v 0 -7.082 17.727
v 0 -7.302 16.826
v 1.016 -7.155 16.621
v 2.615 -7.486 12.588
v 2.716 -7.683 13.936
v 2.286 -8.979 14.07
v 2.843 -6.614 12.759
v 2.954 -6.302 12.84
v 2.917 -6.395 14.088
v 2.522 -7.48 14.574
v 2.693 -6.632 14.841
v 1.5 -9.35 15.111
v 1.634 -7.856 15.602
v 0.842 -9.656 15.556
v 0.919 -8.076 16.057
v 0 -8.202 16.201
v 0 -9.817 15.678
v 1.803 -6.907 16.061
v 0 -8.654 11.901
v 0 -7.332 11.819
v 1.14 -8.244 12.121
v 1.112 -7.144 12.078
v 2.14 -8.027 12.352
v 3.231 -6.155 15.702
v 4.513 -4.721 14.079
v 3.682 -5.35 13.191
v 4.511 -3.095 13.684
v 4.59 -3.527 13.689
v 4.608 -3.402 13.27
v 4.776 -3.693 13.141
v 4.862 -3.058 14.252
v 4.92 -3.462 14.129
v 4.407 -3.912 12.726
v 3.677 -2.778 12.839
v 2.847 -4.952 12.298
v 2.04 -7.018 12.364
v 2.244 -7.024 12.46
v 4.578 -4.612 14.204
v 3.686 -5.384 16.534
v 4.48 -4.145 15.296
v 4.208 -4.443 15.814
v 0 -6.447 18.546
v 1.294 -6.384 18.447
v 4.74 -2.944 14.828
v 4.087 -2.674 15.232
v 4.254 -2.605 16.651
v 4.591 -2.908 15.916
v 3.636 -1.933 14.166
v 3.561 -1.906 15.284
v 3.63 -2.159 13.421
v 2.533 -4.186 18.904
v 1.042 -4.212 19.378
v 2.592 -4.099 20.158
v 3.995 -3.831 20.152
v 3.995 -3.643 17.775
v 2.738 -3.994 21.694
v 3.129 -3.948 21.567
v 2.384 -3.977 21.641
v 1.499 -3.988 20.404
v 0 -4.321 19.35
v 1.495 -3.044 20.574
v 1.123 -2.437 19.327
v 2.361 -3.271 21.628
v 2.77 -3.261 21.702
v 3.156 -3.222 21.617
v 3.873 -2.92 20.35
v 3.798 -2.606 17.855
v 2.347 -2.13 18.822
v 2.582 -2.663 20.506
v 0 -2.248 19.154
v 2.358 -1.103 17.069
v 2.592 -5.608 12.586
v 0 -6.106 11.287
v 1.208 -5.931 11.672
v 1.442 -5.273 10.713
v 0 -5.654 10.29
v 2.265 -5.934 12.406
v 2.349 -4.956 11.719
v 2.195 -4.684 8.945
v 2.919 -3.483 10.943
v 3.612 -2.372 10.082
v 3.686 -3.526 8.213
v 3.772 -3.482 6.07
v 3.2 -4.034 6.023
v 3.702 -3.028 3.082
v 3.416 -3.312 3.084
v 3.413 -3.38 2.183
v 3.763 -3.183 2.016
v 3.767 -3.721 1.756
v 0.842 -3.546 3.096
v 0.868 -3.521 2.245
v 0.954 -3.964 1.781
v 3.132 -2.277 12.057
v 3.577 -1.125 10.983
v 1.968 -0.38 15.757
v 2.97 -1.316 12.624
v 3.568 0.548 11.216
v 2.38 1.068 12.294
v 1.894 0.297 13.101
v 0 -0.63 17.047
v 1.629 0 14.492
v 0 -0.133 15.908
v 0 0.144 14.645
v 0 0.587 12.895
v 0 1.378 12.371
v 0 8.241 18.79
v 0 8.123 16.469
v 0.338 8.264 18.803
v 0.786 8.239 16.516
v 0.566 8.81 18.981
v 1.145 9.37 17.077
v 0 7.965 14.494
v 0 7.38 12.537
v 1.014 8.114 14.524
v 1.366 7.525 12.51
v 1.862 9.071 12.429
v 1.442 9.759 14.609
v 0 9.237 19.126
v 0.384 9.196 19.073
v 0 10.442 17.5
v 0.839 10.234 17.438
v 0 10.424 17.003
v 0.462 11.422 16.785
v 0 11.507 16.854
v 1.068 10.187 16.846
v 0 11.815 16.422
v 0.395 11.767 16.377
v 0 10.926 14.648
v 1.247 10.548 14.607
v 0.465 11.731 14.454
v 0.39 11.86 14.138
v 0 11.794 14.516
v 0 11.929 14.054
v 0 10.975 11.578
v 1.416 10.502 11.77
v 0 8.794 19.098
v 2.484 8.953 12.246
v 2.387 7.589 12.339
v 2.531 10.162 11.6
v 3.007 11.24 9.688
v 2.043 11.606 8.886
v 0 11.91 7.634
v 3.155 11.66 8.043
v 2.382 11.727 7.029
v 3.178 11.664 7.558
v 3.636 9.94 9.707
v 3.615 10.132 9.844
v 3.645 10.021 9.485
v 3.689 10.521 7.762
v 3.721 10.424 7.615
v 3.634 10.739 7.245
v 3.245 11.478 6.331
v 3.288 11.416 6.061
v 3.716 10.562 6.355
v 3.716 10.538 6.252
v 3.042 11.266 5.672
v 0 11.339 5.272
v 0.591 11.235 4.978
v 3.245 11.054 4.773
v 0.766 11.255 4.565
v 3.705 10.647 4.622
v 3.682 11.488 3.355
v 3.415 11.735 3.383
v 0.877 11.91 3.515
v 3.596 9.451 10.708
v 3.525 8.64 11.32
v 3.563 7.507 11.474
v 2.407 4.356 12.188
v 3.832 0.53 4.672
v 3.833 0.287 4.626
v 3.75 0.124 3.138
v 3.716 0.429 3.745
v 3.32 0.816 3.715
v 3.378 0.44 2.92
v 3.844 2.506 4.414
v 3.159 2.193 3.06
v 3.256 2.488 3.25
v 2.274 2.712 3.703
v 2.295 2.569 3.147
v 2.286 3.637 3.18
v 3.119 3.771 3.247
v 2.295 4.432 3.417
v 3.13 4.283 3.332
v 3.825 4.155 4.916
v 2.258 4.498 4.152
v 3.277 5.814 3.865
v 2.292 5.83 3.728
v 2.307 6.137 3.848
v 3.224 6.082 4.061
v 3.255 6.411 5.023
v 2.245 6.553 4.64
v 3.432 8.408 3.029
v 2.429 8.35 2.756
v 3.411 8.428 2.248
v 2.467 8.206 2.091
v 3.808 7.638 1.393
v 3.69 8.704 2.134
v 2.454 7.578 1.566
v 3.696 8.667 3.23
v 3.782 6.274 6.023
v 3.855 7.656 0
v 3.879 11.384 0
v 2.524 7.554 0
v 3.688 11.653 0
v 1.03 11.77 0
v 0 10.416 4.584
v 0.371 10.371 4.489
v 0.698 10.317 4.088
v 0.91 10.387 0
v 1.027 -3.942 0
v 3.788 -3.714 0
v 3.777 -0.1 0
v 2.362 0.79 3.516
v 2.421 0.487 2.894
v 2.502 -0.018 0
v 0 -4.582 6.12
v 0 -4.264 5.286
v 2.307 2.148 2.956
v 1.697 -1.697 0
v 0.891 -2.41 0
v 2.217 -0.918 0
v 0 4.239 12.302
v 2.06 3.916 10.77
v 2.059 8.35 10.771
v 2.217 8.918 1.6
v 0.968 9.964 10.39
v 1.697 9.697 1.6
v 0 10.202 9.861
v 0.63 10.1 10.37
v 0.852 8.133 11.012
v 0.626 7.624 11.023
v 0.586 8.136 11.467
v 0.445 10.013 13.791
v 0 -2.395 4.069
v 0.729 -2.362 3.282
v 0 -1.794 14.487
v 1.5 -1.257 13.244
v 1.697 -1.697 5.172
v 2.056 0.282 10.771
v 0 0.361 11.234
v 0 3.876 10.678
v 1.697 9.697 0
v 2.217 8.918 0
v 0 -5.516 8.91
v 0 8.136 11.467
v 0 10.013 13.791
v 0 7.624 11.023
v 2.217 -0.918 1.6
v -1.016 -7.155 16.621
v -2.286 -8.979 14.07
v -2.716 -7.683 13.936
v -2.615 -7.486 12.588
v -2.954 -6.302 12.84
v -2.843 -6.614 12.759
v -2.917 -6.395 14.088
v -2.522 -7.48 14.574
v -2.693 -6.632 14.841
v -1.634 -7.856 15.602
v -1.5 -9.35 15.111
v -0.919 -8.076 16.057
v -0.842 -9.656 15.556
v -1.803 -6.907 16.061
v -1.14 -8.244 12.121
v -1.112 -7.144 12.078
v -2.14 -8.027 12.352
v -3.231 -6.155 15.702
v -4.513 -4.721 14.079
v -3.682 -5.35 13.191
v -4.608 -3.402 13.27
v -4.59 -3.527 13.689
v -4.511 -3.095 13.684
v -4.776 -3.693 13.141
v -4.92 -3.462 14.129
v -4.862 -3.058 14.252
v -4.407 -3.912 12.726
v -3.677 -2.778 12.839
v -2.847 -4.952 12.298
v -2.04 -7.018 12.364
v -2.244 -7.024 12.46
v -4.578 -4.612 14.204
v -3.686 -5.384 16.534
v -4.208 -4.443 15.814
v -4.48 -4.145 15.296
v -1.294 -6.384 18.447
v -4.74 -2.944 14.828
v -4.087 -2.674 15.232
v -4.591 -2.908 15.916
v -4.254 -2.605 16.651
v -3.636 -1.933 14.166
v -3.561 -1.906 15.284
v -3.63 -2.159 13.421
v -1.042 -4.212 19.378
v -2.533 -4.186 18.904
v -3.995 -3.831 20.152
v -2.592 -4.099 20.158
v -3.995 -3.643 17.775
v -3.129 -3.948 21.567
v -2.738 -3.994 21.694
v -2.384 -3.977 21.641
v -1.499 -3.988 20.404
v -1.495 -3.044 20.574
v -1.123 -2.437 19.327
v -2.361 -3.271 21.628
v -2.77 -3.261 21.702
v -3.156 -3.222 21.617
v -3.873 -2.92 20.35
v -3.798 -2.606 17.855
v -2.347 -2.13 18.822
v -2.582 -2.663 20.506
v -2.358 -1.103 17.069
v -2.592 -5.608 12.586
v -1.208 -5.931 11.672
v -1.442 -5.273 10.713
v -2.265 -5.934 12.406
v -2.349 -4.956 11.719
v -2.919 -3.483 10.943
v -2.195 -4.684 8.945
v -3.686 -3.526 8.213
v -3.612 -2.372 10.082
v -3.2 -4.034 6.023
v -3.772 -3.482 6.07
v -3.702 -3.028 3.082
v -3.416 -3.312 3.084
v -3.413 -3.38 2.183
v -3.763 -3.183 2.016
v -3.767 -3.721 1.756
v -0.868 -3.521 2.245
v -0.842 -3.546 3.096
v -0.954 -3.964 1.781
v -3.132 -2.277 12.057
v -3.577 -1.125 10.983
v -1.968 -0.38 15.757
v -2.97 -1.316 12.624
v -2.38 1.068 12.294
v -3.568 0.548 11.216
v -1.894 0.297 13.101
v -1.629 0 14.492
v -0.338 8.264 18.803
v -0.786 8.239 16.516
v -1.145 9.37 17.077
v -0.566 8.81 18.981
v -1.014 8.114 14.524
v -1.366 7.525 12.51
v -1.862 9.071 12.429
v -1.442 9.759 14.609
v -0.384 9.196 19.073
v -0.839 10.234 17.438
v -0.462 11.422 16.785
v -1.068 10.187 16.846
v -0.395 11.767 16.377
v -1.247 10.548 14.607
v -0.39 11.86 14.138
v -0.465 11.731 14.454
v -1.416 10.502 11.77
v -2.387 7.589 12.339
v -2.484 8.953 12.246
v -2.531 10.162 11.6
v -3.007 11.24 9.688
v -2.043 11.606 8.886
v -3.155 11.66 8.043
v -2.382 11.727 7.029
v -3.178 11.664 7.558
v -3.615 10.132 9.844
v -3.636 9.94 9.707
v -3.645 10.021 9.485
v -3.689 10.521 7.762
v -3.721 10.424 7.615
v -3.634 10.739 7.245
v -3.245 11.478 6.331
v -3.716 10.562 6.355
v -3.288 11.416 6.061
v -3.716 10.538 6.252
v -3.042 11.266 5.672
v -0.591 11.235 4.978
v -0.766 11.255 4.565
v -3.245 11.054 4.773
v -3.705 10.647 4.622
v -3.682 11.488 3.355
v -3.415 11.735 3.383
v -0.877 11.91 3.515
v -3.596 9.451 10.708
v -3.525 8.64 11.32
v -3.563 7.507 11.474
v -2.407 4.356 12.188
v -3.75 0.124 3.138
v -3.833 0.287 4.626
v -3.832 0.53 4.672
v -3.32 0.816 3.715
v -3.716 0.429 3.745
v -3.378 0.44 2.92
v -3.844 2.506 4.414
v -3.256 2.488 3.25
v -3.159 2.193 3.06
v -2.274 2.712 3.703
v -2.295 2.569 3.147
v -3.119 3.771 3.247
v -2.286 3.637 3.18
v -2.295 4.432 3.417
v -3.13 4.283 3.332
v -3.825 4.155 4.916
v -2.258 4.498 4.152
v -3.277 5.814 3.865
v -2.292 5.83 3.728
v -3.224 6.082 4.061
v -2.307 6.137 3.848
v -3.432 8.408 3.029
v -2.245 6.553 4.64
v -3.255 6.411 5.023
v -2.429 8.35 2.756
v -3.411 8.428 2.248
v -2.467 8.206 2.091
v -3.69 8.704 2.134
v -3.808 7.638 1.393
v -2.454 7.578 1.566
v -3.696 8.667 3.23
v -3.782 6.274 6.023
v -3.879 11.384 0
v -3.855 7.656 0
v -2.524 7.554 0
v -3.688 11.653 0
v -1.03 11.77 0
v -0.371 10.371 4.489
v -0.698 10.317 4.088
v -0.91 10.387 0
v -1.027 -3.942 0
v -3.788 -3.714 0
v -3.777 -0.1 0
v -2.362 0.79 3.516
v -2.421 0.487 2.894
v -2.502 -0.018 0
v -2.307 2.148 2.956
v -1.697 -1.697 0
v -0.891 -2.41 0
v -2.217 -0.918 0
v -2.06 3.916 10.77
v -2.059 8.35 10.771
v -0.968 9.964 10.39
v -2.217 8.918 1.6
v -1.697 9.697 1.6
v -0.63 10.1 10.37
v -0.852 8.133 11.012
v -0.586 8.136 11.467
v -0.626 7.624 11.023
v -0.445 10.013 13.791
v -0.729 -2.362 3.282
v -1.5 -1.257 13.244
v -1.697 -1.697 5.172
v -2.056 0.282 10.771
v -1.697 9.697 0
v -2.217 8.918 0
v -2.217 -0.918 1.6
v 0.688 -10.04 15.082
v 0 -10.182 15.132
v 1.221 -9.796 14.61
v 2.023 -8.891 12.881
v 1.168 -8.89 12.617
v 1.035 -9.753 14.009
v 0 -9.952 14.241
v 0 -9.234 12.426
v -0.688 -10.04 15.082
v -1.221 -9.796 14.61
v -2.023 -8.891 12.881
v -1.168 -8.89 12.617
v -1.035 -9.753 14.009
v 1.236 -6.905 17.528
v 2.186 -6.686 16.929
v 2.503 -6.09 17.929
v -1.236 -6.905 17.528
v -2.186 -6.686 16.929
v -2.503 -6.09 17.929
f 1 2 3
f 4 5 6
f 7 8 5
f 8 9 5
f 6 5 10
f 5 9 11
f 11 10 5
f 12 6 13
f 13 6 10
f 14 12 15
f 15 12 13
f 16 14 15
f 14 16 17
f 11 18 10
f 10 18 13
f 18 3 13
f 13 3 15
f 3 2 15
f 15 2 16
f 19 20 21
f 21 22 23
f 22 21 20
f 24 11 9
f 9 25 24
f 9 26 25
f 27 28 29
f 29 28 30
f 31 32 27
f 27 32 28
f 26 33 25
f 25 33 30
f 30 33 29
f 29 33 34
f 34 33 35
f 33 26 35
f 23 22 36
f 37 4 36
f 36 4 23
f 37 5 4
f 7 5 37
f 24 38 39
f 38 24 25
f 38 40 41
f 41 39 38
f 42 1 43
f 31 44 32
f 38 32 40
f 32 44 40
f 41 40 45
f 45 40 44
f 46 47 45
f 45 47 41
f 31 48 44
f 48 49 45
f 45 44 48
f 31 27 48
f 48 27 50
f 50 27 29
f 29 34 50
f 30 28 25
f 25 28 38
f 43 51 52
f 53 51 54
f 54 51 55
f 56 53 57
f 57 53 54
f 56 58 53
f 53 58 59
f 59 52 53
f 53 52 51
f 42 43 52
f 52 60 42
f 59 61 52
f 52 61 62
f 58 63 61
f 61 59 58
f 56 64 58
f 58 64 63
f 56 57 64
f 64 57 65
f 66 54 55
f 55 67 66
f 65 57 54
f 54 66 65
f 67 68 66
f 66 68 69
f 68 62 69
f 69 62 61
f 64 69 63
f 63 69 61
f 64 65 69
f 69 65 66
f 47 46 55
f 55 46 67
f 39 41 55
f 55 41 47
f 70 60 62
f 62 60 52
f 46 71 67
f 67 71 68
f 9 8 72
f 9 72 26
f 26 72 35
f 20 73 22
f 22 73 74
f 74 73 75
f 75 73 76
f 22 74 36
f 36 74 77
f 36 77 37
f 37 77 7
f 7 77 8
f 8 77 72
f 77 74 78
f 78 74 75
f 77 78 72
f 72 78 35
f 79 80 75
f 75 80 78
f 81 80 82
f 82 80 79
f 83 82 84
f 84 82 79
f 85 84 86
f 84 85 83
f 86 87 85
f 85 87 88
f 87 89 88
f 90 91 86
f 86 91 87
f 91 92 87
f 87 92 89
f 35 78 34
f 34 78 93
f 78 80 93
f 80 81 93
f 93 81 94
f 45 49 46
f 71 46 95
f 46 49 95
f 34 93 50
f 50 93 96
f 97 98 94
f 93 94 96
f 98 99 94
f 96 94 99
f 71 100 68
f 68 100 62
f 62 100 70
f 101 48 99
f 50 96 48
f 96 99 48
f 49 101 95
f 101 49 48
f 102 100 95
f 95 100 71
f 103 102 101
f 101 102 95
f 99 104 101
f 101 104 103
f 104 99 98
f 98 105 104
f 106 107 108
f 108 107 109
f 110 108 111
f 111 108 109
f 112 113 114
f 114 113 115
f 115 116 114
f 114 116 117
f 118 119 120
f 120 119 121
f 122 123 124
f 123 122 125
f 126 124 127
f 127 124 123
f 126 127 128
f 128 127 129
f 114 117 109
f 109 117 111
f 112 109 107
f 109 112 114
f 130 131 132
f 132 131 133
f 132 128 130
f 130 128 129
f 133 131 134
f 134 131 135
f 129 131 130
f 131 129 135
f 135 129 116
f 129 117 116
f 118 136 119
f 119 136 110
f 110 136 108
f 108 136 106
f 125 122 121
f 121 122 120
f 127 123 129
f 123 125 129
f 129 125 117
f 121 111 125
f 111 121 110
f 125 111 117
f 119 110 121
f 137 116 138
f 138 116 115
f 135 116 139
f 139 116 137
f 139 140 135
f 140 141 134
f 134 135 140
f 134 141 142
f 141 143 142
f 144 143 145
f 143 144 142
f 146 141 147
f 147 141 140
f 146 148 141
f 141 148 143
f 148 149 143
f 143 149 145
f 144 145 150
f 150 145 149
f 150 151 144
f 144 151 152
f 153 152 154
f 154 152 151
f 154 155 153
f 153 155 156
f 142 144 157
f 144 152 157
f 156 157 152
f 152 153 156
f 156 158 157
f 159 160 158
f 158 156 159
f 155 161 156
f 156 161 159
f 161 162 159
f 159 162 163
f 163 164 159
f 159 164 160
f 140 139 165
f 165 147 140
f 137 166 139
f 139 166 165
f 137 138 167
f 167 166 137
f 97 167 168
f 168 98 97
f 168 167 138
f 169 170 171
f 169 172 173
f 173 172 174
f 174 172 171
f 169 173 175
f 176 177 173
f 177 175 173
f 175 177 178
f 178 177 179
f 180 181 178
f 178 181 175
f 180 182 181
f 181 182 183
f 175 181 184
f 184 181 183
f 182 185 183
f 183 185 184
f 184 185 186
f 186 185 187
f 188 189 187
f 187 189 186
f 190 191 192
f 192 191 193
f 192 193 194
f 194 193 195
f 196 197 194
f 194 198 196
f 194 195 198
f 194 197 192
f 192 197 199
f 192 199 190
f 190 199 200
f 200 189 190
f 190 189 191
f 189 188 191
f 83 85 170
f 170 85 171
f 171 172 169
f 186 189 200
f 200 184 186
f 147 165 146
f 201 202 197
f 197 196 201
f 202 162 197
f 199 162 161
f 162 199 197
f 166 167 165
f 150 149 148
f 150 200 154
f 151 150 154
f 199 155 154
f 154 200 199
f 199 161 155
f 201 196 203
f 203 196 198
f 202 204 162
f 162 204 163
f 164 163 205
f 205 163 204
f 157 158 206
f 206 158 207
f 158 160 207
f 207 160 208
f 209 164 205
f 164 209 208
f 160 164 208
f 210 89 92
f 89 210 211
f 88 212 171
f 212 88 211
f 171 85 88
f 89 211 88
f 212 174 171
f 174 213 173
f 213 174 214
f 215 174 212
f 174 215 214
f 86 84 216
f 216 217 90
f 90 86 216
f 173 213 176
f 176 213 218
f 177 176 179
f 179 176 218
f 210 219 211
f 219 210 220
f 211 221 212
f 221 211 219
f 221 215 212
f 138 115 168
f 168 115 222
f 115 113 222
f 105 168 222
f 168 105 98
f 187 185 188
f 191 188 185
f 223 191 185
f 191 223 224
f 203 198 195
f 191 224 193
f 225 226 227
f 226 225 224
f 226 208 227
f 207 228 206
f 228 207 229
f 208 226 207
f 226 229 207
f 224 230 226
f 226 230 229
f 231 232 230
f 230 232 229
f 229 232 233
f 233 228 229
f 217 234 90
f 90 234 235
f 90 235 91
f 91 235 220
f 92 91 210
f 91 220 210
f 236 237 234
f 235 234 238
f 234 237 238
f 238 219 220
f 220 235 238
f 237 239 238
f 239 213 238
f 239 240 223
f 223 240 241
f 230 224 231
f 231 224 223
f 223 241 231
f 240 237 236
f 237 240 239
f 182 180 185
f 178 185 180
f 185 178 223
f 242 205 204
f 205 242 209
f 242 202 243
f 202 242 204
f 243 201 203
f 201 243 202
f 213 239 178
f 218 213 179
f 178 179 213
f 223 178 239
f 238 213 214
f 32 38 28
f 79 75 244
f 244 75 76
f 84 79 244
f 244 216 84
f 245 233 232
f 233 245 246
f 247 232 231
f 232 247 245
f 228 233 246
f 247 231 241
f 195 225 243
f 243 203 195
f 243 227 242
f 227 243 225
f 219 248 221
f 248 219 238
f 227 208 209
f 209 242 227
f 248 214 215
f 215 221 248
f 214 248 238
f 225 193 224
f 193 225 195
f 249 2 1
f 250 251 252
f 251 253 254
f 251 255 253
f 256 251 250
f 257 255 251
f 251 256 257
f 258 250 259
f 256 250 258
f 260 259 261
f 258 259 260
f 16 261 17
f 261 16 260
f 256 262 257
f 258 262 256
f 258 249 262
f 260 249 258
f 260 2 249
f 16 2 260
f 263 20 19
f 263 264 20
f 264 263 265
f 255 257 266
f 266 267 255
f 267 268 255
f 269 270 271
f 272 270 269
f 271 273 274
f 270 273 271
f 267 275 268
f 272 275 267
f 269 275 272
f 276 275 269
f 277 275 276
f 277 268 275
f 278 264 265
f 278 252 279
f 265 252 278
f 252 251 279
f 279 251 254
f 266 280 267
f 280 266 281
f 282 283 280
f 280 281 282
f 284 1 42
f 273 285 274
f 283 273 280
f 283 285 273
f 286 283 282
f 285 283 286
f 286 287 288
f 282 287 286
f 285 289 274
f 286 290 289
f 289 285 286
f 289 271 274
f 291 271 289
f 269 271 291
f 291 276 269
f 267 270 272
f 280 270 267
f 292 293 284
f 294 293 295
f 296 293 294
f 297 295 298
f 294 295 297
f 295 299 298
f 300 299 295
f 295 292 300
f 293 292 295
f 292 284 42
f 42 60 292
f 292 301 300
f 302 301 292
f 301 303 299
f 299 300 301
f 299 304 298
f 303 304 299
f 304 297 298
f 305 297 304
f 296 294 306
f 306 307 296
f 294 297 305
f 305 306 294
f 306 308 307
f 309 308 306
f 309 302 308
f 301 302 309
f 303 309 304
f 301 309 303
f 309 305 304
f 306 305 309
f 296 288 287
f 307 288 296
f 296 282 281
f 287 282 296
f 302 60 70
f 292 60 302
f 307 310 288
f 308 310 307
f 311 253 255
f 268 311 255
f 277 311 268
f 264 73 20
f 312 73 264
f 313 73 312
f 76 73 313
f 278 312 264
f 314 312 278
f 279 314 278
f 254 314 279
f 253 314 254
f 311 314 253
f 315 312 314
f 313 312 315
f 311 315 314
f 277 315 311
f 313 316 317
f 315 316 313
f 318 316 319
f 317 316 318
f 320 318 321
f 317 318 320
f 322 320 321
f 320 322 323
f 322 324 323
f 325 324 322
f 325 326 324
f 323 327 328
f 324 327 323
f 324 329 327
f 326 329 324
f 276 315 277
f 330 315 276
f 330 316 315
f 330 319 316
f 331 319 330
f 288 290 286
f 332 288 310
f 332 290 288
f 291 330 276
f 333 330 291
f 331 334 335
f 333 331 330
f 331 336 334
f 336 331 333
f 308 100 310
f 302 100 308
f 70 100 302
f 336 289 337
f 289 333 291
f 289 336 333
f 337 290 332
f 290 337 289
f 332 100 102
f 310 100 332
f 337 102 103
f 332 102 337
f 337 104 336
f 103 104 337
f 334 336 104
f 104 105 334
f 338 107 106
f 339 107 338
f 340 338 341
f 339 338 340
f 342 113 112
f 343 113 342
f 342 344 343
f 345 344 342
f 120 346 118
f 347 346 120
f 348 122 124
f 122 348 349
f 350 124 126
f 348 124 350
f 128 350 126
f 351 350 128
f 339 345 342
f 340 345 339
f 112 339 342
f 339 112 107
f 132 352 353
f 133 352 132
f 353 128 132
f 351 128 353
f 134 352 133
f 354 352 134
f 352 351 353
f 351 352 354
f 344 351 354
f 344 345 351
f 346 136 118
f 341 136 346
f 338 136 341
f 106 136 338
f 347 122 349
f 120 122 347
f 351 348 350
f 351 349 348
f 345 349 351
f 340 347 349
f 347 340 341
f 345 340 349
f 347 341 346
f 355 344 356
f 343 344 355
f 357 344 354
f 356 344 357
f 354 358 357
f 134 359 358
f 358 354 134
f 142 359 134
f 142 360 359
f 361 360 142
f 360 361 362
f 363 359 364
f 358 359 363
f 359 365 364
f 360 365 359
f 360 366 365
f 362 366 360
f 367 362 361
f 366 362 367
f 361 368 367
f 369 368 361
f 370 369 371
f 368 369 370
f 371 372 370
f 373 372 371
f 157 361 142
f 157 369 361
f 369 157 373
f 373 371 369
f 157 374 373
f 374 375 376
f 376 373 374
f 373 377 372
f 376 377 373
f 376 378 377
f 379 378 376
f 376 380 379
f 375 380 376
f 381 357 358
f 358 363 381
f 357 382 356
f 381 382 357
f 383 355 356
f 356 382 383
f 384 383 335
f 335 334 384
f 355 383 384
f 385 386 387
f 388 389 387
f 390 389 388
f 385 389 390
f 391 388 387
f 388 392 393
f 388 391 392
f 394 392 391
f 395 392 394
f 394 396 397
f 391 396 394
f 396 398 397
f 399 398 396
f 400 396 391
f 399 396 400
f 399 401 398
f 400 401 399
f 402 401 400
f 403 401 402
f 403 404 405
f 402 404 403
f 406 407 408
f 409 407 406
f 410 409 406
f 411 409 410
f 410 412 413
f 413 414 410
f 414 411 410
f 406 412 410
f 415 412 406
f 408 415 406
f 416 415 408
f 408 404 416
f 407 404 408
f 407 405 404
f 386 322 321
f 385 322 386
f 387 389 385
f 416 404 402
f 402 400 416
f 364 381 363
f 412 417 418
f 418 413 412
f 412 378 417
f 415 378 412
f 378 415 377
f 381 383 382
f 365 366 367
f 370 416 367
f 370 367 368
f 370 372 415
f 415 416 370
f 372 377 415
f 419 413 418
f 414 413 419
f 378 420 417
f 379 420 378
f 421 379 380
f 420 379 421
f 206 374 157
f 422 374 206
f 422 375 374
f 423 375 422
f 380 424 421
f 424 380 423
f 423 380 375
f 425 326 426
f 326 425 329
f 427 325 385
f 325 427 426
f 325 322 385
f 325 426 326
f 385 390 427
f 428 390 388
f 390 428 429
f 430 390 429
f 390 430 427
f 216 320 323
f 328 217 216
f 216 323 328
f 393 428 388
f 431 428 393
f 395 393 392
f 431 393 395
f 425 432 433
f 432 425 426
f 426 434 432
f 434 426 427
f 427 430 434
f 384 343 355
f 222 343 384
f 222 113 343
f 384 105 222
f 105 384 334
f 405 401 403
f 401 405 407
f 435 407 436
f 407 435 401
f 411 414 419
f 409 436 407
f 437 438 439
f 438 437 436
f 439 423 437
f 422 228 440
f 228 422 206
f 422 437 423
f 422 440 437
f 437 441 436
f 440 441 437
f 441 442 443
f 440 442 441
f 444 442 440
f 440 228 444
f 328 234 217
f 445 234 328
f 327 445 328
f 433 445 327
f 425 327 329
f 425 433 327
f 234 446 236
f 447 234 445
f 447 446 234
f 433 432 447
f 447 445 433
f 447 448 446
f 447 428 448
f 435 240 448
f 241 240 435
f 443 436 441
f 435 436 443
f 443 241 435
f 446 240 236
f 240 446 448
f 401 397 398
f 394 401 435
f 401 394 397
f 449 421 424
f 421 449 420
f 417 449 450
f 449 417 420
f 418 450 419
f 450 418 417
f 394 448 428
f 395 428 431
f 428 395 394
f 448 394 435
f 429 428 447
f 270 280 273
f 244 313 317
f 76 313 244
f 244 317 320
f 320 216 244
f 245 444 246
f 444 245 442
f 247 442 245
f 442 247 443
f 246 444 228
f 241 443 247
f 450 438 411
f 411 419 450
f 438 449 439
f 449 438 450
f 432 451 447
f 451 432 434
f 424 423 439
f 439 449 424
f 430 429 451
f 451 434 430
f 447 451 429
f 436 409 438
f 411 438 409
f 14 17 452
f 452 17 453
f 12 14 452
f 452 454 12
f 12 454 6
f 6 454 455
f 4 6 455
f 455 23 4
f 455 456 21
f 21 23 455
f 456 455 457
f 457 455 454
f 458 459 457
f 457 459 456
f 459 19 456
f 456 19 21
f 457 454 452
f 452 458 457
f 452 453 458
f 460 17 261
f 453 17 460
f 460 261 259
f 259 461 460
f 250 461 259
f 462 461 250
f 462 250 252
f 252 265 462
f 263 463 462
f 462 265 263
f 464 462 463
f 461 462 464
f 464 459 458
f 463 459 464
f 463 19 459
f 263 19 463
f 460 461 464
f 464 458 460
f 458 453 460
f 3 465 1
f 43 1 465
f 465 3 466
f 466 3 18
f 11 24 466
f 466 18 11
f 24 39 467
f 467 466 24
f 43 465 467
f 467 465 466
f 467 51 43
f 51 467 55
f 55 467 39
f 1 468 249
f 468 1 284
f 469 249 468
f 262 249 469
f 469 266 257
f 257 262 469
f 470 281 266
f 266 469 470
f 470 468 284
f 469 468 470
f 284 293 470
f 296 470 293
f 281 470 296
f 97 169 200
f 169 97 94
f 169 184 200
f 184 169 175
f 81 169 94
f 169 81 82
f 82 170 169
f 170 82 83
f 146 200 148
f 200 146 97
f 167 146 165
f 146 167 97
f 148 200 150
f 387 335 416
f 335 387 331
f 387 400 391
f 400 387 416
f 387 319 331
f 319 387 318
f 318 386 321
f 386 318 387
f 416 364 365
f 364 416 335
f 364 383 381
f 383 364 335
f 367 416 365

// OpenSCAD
use <../lib.scad>
use <s/26078s01.scad>
use <s/26078s02.scad>
use <s/26078s03.scad>
use <s/26078s04.scad>
function ldraw_lib__26078() = [
// 0 Animal Dog Terrier
// 0 Name: 26078.dat
// 0 Author: Philippe Hurbain [Philo]
// 0 !LDRAW_ORG Part UPDATE 2024-09
// 0 !LICENSE Licensed under CC BY 4.0 : see CAreadme.txt
// 
// 0 BFC CERTIFY CCW
  [0,"BFC","CERTIFY"],
  [0,"BFC","CCW"],
// 
// 0 !HISTORY 2016-10-05 {LEGO Digital Designer} Original part shape
// 0 !HISTORY 2021-07-04 [Philo] File preparation for LDraw Parts Tracker
// 0 !HISTORY 2024-10-27 [OrionP] Official Update 2024-09
// 
// 
// 1 16 0 0 0 1 0 0 0 1 0 0 0 1 s\26078s01.dat
  [1,16,0,0,0,1,0,0,0,1,0,0,0,1, ldraw_lib__s__26078s01()],
// 1 16 0 0 0 -1 0 0 0 1 0 0 0 1 s\26078s01.dat
  [1,16,0,0,0,-1,0,0,0,1,0,0,0,1, ldraw_lib__s__26078s01()],
// 1 16 0 0 0 1 0 0 0 1 0 0 0 1 s\26078s02.dat
  [1,16,0,0,0,1,0,0,0,1,0,0,0,1, ldraw_lib__s__26078s02()],
// 1 16 0 0 0 -1 0 0 0 1 0 0 0 1 s\26078s02.dat
  [1,16,0,0,0,-1,0,0,0,1,0,0,0,1, ldraw_lib__s__26078s02()],
// 1 16 0 0 0 1 0 0 0 1 0 0 0 1 s\26078s03.dat
  [1,16,0,0,0,1,0,0,0,1,0,0,0,1, ldraw_lib__s__26078s03()],
// 1 16 0 0 0 -1 0 0 0 1 0 0 0 1 s\26078s03.dat
  [1,16,0,0,0,-1,0,0,0,1,0,0,0,1, ldraw_lib__s__26078s03()],
// 1 16 0 0 0 1 0 0 0 1 0 0 0 1 s\26078s04.dat
  [1,16,0,0,0,1,0,0,0,1,0,0,0,1, ldraw_lib__s__26078s04()],
// 1 16 0 0 0 -1 0 0 0 1 0 0 0 1 s\26078s04.dat
  [1,16,0,0,0,-1,0,0,0,1,0,0,0,1, ldraw_lib__s__26078s04()],
];
module ldraw_lib__26078(step=0, col=false, unit=2/5, alt=false, line=0.2, solid=!$preview)
    makepoly(ldraw_lib__26078(), step=step, col=col, unit=unit, alt=alt, line=line, solid=solid);
ldraw_lib__26078(line=0.2);
